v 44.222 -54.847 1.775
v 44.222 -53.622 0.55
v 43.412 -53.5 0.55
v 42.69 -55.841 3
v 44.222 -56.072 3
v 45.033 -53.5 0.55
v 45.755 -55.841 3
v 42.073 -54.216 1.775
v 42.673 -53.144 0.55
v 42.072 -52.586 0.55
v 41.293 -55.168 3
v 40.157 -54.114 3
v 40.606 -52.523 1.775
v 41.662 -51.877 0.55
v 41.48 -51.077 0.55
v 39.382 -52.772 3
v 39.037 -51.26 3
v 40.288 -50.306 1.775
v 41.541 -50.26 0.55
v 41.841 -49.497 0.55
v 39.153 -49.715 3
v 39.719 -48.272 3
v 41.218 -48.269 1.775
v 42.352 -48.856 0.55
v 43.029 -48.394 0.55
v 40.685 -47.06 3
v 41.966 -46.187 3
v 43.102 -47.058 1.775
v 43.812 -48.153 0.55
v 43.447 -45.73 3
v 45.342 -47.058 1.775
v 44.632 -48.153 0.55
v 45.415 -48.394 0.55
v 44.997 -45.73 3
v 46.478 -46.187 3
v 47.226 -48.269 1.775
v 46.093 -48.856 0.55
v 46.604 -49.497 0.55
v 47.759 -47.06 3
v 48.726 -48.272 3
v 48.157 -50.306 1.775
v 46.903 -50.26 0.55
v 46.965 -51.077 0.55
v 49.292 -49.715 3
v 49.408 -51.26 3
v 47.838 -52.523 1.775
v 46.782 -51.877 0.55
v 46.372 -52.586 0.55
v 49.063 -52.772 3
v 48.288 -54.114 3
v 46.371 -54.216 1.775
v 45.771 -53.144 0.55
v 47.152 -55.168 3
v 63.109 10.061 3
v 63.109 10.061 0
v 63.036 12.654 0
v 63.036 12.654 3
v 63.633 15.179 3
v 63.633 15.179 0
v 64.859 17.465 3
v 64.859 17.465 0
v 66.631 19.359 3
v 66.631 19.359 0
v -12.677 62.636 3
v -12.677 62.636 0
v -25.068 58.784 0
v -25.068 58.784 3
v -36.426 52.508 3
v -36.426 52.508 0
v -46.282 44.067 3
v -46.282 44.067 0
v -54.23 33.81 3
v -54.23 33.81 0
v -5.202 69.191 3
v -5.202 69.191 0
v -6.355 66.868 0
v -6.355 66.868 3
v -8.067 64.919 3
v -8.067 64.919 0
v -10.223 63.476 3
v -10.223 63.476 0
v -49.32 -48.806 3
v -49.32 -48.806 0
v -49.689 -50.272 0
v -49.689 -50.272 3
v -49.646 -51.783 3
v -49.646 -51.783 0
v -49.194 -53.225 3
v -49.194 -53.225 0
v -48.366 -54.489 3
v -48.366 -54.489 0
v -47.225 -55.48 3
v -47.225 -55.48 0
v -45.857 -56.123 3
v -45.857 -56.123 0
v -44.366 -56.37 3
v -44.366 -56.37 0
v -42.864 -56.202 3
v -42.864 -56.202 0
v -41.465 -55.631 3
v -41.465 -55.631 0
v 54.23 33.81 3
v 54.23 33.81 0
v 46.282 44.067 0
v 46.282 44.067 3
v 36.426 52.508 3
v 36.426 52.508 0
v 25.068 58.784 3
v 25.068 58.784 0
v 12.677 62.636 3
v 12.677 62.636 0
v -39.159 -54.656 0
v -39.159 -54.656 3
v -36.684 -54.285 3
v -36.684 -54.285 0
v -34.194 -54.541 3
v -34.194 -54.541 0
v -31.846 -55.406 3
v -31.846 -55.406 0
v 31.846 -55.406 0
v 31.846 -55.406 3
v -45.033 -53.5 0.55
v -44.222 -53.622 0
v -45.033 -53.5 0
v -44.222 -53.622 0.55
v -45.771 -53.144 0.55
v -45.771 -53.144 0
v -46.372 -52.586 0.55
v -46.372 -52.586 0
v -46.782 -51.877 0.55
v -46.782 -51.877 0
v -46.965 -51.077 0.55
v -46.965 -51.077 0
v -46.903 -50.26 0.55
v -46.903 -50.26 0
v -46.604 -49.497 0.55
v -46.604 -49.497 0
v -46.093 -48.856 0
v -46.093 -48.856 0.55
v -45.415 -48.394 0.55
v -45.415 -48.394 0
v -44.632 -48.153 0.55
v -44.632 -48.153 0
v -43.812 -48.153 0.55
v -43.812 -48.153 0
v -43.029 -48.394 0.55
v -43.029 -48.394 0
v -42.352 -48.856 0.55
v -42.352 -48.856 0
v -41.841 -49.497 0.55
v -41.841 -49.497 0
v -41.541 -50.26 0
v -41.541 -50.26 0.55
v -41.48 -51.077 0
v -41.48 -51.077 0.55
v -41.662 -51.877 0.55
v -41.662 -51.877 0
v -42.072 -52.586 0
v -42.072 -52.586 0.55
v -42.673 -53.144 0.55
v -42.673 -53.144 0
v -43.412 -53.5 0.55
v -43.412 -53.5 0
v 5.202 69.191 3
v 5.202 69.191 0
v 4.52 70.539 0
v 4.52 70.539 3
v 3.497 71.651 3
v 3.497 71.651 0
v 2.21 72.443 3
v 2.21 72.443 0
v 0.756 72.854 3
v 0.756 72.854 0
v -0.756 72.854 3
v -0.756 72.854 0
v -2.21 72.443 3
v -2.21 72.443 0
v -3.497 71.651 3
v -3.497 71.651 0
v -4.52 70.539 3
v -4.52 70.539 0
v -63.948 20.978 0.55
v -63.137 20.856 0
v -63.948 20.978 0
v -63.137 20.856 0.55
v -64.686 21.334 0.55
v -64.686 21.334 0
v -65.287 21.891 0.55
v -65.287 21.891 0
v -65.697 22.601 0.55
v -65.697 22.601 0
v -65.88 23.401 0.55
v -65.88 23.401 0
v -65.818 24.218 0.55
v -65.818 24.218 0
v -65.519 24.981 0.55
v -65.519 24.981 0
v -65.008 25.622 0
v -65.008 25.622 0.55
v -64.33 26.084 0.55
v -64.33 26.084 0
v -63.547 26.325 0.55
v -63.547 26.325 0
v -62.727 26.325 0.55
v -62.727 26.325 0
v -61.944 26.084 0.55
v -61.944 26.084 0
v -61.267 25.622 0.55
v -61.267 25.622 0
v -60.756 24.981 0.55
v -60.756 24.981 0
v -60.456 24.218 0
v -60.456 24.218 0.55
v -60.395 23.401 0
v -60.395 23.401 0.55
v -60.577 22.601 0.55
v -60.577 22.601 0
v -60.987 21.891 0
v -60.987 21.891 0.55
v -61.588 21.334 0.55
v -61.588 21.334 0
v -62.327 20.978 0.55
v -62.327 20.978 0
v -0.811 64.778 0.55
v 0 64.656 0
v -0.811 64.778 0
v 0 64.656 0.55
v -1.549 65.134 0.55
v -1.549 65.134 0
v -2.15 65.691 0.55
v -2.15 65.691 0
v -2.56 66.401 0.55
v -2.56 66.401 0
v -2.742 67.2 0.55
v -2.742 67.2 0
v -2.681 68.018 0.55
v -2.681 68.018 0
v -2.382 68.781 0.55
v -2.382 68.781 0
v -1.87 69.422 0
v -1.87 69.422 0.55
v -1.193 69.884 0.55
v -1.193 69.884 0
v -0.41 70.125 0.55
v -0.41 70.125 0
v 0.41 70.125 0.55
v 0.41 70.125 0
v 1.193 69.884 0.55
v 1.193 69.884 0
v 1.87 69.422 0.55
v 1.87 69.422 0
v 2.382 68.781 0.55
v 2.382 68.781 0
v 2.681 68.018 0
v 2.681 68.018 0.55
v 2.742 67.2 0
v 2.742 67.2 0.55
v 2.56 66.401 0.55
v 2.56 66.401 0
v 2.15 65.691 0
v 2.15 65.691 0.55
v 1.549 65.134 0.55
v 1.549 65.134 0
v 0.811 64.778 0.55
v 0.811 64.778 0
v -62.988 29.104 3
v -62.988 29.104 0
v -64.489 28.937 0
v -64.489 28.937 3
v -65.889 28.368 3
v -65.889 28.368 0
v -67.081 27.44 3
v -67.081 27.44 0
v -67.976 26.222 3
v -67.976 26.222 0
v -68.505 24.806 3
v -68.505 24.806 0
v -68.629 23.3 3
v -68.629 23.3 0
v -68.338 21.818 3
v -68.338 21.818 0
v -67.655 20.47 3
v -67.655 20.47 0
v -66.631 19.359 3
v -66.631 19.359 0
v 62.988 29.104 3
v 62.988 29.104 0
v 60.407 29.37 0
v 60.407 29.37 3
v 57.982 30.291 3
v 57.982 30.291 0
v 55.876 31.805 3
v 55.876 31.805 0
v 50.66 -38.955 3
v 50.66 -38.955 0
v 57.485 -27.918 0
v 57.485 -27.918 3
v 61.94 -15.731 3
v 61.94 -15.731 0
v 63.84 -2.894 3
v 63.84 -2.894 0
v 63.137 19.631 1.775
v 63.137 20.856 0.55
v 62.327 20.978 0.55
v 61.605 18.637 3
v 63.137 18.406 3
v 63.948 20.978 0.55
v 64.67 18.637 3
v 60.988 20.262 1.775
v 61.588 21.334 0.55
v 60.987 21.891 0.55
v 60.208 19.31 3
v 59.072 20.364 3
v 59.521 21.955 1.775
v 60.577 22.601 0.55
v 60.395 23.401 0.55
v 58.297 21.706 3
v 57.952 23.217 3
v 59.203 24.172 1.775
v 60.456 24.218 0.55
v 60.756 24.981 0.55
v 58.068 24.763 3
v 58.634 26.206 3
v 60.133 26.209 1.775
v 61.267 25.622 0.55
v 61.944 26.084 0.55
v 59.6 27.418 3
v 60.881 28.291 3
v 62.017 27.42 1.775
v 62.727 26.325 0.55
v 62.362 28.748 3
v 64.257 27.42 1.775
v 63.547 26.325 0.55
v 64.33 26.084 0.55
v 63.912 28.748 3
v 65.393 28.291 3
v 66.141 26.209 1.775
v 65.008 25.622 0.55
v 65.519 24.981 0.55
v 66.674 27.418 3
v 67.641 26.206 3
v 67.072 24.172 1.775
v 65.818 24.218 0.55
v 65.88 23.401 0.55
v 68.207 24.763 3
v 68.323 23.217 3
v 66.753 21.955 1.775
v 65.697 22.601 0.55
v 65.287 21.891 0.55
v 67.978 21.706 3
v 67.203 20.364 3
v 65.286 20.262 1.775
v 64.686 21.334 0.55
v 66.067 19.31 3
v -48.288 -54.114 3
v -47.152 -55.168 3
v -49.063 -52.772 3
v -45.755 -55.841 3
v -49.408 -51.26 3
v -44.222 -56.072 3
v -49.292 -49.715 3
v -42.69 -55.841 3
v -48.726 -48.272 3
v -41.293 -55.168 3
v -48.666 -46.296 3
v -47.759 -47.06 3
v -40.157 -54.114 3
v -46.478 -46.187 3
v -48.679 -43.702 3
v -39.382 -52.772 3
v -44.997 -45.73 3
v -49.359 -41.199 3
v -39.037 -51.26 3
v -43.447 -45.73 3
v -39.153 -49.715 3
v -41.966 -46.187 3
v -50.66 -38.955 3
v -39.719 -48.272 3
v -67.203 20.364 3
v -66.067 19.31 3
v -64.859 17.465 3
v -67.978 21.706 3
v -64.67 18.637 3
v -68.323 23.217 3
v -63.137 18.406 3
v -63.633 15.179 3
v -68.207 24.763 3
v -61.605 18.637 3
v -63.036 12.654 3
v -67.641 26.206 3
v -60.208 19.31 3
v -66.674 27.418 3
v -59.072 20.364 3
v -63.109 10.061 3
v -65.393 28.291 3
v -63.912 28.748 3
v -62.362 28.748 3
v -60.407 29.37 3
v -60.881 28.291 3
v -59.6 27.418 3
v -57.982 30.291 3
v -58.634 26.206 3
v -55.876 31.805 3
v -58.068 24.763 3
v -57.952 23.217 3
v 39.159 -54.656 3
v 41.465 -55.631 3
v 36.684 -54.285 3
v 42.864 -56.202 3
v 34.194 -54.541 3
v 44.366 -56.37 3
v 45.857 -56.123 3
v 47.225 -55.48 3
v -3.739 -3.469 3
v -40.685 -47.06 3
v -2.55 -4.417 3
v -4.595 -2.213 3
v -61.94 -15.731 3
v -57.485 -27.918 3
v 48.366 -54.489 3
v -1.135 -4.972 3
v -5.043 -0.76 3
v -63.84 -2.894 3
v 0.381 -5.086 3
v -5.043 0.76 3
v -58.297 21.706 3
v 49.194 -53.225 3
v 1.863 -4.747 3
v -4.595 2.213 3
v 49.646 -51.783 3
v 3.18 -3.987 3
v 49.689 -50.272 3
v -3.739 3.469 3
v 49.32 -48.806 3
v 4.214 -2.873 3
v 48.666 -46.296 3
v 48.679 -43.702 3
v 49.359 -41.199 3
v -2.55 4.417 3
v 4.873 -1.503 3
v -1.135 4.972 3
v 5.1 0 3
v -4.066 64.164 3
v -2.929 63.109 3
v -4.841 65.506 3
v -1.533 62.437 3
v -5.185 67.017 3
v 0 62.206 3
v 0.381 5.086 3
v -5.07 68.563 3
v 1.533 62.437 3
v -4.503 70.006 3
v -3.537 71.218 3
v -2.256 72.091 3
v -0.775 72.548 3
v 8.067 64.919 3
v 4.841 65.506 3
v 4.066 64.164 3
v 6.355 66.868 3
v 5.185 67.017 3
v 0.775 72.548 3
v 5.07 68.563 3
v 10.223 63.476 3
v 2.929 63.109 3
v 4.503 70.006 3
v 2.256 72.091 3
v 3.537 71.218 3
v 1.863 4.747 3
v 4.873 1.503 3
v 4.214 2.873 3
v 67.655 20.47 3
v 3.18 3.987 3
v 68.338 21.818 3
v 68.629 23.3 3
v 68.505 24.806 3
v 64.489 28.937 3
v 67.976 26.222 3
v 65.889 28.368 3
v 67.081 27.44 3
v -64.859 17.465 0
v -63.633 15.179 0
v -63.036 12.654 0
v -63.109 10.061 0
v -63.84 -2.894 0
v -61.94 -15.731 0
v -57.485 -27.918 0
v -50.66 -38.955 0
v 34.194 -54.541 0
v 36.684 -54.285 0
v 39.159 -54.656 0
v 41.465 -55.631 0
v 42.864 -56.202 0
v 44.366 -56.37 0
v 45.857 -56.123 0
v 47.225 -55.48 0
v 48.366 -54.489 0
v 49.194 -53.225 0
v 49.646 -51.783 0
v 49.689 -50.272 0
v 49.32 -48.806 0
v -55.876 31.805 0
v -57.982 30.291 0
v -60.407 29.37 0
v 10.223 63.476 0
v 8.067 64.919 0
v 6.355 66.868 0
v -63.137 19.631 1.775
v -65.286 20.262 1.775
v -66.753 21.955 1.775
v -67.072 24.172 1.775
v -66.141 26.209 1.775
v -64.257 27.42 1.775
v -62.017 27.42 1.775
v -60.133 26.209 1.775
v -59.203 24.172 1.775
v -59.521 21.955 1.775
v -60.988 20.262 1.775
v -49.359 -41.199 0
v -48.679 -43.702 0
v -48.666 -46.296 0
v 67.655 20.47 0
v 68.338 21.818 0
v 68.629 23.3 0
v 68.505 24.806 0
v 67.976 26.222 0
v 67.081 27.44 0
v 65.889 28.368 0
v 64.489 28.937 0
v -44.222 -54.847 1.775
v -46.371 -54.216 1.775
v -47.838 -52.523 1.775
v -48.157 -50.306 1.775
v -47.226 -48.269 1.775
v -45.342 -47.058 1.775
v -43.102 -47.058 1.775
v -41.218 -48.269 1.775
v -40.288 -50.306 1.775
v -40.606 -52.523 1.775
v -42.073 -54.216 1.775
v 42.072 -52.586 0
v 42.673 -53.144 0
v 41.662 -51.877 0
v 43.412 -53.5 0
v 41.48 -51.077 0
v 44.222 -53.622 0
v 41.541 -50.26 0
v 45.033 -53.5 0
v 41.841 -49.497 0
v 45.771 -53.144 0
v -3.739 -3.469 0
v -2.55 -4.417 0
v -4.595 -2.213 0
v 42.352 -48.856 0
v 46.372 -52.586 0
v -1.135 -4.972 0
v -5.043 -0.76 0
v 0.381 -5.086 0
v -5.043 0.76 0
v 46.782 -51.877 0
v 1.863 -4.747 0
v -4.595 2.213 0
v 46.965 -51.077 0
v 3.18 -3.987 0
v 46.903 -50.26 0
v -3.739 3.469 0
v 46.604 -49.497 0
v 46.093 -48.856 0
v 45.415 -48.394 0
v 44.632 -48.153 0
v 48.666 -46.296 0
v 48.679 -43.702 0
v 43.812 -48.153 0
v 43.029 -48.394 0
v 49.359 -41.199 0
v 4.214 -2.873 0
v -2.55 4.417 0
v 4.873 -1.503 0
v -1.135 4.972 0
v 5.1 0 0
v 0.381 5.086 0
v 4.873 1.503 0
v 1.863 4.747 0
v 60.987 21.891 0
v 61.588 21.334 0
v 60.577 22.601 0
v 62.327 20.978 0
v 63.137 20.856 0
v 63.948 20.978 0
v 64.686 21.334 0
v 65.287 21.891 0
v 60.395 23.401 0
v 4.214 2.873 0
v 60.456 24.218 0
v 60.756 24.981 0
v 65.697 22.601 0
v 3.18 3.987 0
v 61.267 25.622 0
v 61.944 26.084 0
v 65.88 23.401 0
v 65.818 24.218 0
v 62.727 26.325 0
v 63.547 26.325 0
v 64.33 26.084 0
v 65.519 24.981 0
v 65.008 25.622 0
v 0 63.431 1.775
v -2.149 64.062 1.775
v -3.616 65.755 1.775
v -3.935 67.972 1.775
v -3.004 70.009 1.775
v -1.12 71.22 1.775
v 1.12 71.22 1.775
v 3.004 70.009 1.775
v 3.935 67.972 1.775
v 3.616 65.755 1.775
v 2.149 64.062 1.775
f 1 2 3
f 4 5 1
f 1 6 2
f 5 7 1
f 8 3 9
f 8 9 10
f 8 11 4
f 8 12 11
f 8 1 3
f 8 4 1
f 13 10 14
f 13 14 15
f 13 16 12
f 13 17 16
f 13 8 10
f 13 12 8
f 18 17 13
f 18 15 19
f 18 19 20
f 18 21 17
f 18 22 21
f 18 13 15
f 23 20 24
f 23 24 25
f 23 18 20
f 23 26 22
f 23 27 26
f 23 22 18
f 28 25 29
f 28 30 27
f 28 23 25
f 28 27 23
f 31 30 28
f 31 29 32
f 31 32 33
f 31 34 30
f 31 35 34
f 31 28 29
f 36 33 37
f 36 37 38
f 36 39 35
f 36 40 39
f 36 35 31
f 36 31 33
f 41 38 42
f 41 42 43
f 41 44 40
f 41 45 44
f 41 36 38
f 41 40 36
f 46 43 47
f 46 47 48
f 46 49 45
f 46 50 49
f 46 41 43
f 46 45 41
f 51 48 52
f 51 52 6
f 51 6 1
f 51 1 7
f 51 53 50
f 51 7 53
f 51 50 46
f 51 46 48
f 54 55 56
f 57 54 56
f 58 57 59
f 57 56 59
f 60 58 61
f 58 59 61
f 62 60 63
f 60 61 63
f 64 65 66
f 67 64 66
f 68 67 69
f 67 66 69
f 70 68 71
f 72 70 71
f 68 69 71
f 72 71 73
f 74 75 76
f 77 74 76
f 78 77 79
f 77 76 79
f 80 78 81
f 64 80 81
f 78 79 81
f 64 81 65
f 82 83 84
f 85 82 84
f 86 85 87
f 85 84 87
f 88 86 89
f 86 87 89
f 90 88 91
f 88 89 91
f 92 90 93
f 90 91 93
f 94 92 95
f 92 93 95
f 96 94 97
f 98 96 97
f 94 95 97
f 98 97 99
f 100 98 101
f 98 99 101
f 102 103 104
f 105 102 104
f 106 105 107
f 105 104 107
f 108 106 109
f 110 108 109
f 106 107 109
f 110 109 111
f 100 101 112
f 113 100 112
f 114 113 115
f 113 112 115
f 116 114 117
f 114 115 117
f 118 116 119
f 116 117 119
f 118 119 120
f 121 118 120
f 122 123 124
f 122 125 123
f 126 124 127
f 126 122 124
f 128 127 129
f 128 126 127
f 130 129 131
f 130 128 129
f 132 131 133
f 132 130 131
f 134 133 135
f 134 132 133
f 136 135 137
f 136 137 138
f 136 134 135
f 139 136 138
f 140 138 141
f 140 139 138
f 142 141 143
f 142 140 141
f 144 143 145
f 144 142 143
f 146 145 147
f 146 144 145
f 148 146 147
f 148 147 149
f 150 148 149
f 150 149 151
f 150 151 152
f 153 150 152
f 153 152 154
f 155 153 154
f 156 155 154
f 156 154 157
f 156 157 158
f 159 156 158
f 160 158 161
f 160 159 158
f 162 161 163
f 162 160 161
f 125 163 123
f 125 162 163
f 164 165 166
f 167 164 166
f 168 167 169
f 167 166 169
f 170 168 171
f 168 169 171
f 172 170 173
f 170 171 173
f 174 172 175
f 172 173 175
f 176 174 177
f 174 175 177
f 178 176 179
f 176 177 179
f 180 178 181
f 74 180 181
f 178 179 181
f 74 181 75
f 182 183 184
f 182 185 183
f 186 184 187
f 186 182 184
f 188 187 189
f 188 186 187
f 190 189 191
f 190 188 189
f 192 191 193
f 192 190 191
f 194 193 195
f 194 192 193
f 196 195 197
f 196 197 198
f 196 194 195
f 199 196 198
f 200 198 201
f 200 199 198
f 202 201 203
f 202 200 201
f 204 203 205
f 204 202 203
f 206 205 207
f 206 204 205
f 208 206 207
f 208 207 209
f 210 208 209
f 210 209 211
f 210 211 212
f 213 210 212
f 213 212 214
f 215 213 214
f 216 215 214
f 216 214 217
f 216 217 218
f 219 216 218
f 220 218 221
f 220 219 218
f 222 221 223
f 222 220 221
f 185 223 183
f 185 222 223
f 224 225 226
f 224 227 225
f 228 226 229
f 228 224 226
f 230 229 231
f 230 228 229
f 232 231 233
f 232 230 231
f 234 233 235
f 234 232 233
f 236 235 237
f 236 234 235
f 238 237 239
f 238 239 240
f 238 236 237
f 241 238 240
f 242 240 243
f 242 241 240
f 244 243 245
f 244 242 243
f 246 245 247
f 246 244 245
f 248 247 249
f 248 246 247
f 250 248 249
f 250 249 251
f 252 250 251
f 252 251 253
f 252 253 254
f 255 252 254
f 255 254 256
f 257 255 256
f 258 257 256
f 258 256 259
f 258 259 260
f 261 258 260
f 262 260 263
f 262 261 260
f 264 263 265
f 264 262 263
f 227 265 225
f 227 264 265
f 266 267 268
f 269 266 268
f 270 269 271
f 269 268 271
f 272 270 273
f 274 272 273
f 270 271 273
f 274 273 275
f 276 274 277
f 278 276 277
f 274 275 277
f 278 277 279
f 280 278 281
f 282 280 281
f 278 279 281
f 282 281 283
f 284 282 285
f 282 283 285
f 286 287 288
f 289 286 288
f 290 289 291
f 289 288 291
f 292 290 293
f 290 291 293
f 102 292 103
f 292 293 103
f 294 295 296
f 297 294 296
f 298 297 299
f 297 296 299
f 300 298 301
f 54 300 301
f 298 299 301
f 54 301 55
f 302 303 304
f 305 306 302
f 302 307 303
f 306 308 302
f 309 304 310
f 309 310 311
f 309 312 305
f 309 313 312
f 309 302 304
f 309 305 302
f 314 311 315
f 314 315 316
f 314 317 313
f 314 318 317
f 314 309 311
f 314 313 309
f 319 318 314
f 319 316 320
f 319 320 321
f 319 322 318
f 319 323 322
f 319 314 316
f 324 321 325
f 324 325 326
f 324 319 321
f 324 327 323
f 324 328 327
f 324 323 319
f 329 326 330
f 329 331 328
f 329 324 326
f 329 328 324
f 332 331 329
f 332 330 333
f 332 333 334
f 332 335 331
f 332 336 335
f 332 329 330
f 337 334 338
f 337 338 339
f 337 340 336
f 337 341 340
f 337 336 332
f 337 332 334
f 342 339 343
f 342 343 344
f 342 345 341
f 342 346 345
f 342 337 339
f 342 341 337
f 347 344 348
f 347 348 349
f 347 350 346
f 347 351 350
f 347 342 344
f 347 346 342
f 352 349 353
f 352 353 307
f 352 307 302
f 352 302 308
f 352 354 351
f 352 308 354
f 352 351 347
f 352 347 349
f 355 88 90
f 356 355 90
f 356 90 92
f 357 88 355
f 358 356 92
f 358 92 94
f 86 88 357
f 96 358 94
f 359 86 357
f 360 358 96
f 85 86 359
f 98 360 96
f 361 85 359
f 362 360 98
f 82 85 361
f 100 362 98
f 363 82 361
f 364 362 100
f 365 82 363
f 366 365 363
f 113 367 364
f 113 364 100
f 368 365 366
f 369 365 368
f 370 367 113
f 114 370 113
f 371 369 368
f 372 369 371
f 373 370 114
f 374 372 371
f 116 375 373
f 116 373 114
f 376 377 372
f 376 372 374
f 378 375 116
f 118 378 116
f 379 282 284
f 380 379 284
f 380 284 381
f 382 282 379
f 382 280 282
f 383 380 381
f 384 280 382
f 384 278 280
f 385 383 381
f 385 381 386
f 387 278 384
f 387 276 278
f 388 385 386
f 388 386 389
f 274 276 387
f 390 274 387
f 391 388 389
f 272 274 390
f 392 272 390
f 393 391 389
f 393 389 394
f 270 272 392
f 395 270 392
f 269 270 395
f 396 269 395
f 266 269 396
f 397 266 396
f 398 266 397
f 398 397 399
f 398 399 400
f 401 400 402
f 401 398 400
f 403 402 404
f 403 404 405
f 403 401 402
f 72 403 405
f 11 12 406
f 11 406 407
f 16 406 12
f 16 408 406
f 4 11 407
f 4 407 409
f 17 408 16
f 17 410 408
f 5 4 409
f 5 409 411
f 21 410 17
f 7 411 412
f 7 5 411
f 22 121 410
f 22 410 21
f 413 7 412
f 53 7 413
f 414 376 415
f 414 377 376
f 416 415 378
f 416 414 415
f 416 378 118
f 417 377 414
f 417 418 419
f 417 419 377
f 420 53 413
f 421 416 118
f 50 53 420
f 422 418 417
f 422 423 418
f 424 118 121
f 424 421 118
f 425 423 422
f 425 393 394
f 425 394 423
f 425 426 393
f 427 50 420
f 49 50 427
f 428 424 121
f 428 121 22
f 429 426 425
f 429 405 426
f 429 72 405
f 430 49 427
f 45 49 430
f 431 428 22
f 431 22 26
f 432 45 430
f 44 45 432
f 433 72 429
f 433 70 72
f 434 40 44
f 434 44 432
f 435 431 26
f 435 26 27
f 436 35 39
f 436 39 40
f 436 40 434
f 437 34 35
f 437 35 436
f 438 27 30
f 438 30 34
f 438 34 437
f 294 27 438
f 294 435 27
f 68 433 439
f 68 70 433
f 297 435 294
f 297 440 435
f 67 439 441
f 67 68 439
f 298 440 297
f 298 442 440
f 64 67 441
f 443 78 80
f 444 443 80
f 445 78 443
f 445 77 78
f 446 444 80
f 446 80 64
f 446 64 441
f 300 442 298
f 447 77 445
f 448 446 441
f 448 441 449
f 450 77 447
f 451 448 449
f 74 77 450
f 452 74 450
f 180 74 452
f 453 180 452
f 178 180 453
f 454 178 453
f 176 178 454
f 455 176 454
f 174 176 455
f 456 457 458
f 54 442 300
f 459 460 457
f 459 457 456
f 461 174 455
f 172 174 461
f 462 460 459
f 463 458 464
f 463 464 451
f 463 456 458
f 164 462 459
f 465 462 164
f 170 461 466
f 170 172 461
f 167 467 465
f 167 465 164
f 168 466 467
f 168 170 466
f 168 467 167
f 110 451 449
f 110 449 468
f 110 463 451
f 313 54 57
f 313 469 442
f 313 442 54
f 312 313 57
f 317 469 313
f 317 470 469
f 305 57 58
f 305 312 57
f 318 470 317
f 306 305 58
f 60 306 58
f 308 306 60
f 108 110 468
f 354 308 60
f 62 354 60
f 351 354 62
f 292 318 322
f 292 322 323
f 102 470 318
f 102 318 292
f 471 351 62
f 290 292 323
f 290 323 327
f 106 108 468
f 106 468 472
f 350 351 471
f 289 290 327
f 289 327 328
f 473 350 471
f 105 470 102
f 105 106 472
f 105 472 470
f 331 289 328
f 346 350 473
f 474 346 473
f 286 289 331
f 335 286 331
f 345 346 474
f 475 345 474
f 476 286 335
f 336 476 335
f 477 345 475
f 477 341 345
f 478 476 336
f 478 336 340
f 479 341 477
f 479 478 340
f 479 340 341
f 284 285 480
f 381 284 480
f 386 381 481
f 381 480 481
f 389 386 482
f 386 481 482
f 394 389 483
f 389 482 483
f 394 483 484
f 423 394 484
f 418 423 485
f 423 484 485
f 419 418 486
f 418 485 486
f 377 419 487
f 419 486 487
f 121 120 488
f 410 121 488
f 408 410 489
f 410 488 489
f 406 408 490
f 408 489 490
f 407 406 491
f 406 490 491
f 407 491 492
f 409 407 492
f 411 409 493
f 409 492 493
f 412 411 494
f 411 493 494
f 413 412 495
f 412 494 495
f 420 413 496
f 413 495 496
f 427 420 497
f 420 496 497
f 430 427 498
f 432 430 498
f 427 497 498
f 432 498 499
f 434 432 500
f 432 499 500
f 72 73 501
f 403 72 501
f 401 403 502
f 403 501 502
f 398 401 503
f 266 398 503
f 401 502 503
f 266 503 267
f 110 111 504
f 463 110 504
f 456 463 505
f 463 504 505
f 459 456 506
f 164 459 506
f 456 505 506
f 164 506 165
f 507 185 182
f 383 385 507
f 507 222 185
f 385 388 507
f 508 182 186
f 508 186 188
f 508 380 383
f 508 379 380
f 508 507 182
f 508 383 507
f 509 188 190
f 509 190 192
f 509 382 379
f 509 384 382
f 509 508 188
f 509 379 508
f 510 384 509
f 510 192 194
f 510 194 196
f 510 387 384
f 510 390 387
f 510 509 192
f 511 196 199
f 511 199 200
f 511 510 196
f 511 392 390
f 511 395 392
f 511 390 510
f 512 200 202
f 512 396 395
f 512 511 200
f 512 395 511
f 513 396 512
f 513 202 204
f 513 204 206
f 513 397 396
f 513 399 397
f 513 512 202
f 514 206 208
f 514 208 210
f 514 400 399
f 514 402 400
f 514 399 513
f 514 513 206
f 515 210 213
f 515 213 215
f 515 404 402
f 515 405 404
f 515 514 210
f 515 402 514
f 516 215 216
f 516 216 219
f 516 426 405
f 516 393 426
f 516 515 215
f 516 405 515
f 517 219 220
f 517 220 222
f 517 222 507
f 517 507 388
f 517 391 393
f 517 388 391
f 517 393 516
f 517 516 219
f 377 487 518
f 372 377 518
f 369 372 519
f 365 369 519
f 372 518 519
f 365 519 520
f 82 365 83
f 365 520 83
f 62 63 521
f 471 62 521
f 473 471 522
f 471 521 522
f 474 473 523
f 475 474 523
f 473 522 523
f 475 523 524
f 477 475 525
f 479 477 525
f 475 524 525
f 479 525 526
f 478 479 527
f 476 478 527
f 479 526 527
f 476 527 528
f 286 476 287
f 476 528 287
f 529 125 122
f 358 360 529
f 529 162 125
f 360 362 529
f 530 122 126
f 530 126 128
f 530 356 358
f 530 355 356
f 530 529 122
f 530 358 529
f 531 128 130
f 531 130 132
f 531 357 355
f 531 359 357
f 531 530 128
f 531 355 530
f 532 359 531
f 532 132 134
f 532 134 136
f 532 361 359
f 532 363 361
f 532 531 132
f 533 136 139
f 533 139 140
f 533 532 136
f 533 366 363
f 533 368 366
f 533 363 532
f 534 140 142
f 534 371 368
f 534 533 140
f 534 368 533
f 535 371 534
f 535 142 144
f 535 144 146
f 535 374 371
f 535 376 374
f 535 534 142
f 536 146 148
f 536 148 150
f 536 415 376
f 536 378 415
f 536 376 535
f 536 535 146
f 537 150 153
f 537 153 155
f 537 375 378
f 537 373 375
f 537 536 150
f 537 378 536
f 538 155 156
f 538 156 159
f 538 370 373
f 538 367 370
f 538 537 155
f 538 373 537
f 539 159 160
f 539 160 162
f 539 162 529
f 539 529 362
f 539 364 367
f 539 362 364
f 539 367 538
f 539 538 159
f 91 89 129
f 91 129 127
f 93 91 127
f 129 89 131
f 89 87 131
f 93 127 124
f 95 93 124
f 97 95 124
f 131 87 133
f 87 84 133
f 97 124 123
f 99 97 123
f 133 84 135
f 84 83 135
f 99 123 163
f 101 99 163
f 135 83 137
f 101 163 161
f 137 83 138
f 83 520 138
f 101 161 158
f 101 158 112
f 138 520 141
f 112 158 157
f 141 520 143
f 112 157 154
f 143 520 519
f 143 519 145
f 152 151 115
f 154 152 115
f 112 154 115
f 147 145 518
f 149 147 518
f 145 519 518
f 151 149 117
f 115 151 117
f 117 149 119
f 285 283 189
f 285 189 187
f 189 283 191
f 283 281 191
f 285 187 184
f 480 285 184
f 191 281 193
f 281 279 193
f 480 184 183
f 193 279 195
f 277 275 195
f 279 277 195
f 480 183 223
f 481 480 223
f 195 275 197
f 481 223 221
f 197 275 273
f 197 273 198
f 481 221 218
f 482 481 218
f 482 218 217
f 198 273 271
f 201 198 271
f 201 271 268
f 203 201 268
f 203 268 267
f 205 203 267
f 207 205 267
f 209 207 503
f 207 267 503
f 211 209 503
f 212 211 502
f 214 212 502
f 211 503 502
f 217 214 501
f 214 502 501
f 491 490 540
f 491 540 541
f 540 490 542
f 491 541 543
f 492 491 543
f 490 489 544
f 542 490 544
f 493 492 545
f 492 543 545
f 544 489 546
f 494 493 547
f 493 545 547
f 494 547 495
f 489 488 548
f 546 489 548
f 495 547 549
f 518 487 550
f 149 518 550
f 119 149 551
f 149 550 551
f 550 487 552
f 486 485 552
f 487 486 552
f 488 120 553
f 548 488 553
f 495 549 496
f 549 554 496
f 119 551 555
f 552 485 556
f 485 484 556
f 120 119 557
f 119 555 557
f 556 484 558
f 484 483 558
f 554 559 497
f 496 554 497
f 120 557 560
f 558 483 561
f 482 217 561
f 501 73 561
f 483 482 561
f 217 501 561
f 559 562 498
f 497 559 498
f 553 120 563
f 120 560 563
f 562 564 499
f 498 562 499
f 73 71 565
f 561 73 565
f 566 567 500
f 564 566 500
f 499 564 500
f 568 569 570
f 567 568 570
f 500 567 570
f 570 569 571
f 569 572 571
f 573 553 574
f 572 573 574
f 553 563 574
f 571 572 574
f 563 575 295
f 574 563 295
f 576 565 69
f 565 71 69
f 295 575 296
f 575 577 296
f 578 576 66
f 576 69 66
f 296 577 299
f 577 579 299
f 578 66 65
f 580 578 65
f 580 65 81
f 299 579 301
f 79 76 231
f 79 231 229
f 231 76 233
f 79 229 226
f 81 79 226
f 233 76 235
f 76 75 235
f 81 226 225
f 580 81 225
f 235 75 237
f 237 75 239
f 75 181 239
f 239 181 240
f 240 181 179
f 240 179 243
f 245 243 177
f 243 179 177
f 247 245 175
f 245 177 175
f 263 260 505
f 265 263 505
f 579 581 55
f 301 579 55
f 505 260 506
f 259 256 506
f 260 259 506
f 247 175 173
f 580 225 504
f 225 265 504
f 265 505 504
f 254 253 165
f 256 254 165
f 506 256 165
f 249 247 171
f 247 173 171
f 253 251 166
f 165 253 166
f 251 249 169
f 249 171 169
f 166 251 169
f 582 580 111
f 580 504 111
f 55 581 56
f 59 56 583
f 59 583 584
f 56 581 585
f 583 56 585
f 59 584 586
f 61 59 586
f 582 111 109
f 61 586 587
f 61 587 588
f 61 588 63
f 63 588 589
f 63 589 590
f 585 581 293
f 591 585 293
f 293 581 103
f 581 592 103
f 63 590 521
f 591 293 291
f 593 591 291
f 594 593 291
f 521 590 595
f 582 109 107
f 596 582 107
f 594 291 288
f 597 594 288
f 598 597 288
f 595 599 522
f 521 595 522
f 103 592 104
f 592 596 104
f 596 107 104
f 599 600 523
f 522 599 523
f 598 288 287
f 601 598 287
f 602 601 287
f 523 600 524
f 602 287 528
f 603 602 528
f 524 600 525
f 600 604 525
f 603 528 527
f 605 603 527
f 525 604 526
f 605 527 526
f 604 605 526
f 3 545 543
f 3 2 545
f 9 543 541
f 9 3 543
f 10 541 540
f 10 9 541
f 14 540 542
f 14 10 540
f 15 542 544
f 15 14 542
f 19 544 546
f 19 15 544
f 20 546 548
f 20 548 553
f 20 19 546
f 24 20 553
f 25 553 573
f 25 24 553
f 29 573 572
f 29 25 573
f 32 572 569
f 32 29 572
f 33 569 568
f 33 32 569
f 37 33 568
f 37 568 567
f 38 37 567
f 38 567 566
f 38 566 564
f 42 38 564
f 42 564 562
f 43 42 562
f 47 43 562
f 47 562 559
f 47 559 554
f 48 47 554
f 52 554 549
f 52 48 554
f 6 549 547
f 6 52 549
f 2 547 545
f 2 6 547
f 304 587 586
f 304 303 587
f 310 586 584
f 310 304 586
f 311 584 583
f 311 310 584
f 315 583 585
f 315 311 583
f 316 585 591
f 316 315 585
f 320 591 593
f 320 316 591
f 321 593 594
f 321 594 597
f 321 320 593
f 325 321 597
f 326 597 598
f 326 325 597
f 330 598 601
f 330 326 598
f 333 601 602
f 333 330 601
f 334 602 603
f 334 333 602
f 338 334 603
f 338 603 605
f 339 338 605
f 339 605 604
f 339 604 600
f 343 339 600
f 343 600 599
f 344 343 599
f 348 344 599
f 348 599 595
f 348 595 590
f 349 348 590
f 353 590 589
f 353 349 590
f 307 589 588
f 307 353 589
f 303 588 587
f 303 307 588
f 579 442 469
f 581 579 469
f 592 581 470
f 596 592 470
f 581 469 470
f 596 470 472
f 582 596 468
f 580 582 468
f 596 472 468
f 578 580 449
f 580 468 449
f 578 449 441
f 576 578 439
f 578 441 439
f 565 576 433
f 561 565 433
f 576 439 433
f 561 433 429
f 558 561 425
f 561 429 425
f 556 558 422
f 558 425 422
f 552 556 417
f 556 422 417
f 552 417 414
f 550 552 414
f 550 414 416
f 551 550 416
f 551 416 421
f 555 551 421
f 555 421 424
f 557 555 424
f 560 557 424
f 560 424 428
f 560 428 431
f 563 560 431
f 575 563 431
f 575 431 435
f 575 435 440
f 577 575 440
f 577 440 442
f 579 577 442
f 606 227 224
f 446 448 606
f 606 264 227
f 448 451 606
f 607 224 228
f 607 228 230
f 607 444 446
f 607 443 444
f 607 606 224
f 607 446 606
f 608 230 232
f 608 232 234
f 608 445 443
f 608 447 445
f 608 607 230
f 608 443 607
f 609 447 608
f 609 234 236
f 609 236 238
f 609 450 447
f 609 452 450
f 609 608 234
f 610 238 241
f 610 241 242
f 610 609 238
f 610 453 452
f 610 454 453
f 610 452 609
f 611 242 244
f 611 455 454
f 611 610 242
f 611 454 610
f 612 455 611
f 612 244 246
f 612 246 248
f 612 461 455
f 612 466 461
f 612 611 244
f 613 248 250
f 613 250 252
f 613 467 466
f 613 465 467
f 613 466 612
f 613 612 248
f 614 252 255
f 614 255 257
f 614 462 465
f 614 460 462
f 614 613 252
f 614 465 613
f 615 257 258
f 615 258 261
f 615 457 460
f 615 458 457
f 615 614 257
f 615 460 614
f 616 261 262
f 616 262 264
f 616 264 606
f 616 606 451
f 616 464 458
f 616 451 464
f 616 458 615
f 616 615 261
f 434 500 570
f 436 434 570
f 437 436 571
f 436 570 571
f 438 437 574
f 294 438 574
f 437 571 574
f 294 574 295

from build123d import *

# Parameters (mm, degrees)
BOSS_EXTRUDE1_DEPTH                          = 3
CSK_FOR_M5_COUNTERSUNK_FLAT_HEAD_SCR_2_COUNT = 2
CSK_FOR_M5_COUNTERSUNK_FLAT_HEAD_SCR_2_PITCH = 76.842304832
CSK_FOR_M5_COUNTERSUNK_FLAT_HEAD_SCR_3_COUNT = 2
CSK_FOR_M5_COUNTERSUNK_FLAT_HEAD_SCR_3_PITCH = 126.274488939
CSK_FOR_M5_COUNTERSUNK_FLAT_HEAD_SCR_4_COUNT = 2
CSK_FOR_M5_COUNTERSUNK_FLAT_HEAD_SCR_4_PITCH = 130.663789522
CSK_FOR_M5_COUNTERSUNK_FLAT_HEAD_SCR_5_COUNT = 2
CSK_FOR_M5_COUNTERSUNK_FLAT_HEAD_SCR_5_PITCH = 76.842304832
SKETCH7_R                                    = 5.1
CUT_EXTRUDE1_DEPTH                           = 101.176561813


with BuildPart() as part:
    # Sketch1 → Boss-Extrude1 (new body)
    with BuildSketch(Plane.XY):
        with BuildLine():
            Line((-31.845730134, -55.405913397), (0, -55.405913397))
            Line((0, -55.405913397), (31.845730134, -55.405913397))
            ThreePointArc((31.845730134, -55.405913397), (36.683914759, -54.28538737), (41.464515841, -55.630549937))
            ThreePointArc((41.464515841, -55.630549937), (47.829334185, -55.023876328), (49.319655375, -48.806327923))
            ThreePointArc((49.319655375, -48.806327923), (48.678987264, -43.702284601), (50.66032125, -38.955071786))
            ThreePointArc((50.66032125, -38.955071786), (61.939586577, -15.730651027), (63.108911007, 10.061367629))
            ThreePointArc((63.108911007, 10.061367629), (63.632854976, 15.178710356), (66.631324059, 19.35853057))
            ThreePointArc((66.631324059, 19.35853057), (68.28894151, 25.532189009), (62.987637378, 29.104013283))
            ThreePointArc((62.987637378, 29.104013283), (57.982455244, 30.291390926), (54.229750811, 33.809760336))
            ThreePointArc((54.229750811, 33.809760336), (36.426163747, 52.508098059), (12.677003214, 62.635927043))
            ThreePointArc((12.677003214, 62.635927043), (8.067219644, 64.918821983), (5.202184299, 69.191208475))
            ThreePointArc((5.202184299, 69.191208475), (0, 72.905913397), (-5.202184299, 69.191208475))
            ThreePointArc((-5.202184299, 69.191208475), (-8.067219644, 64.918821983), (-12.677003214, 62.635927043))
            ThreePointArc((-12.677003214, 62.635927043), (-36.426163747, 52.508098059), (-54.229750811, 33.809760336))
            ThreePointArc((-54.229750811, 33.809760336), (-57.982455244, 30.291390926), (-62.987637378, 29.104013283))
            ThreePointArc((-62.987637378, 29.104013283), (-68.28894151, 25.532189009), (-66.631324059, 19.35853057))
            ThreePointArc((-66.631324059, 19.35853057), (-63.632854976, 15.178710356), (-63.108911007, 10.061367629))
            ThreePointArc((-63.108911007, 10.061367629), (-61.939586577, -15.730651027), (-50.66032125, -38.955071786))
            ThreePointArc((-50.66032125, -38.955071786), (-48.678987264, -43.702284601), (-49.319655375, -48.806327923))
            ThreePointArc((-49.319655375, -48.806327923), (-47.829334185, -55.023876328), (-41.464515841, -55.630549937))
            ThreePointArc((-41.464515841, -55.630549937), (-36.683914759, -54.28538737), (-31.845730134, -55.405913397))
        make_face()
    extrude(amount=BOSS_EXTRUDE1_DEPTH)

    # Sketch3 → CSK for M5 Countersunk Flat Head Screw1 (revolve, cut)
    with BuildSketch(Plane(origin=(-63.13724447, 23.606048412, 3), x_dir=(0, -1, 0), z_dir=(1, 0, 0))):
        Polygon((0, 0), (0, 3), (2.75, 3), (2.75, 2.45), (5.2, 0), align=None)
    csk_for_m5_countersunk_flat_head_screw1 = revolve(axis=Axis((-63.13724447, 23.606048412, 9.35), (0, 0, -1)), mode=Mode.SUBTRACT)

    # CSK for M5 Countersunk Flat Head Scr 2: CSK for M5 Countersunk Flat Head Screw1 ×2
    with Locations(*[Vector(0.8216469379421629, 0.5699967625963042, 0) * (i * CSK_FOR_M5_COUNTERSUNK_FLAT_HEAD_SCR_2_PITCH) for i in range(1, CSK_FOR_M5_COUNTERSUNK_FLAT_HEAD_SCR_2_COUNT)]):
        add(csk_for_m5_countersunk_flat_head_screw1, mode=Mode.SUBTRACT)

    # CSK for M5 Countersunk Flat Head Scr 3: CSK for M5 Countersunk Flat Head Screw1 ×2
    with Locations(*[(i * CSK_FOR_M5_COUNTERSUNK_FLAT_HEAD_SCR_3_PITCH, 0, 0) for i in range(1, CSK_FOR_M5_COUNTERSUNK_FLAT_HEAD_SCR_3_COUNT)]):
        add(csk_for_m5_countersunk_flat_head_screw1, mode=Mode.SUBTRACT)

    # CSK for M5 Countersunk Flat Head Scr 4: CSK for M5 Countersunk Flat Head Screw1 ×2
    with Locations(*[Vector(0.8216469379421629, -0.5699967625963043, 0) * (i * CSK_FOR_M5_COUNTERSUNK_FLAT_HEAD_SCR_4_PITCH) for i in range(1, CSK_FOR_M5_COUNTERSUNK_FLAT_HEAD_SCR_4_COUNT)]):
        add(csk_for_m5_countersunk_flat_head_screw1, mode=Mode.SUBTRACT)

    # CSK for M5 Countersunk Flat Head Scr 5: CSK for M5 Countersunk Flat Head Screw1 ×2
    with Locations(*[Vector(0.24615329302899694, -0.9692309097067534, 0) * (i * CSK_FOR_M5_COUNTERSUNK_FLAT_HEAD_SCR_5_PITCH) for i in range(1, CSK_FOR_M5_COUNTERSUNK_FLAT_HEAD_SCR_5_COUNT)]):
        add(csk_for_m5_countersunk_flat_head_screw1, mode=Mode.SUBTRACT)

    # Sketch7 → Cut-Extrude1 (cut, through all)
    with BuildSketch(Plane.XY.offset(3)):
        Circle(SKETCH7_R)
    extrude(amount=-CUT_EXTRUDE1_DEPTH, mode=Mode.SUBTRACT)


solid = part.part
